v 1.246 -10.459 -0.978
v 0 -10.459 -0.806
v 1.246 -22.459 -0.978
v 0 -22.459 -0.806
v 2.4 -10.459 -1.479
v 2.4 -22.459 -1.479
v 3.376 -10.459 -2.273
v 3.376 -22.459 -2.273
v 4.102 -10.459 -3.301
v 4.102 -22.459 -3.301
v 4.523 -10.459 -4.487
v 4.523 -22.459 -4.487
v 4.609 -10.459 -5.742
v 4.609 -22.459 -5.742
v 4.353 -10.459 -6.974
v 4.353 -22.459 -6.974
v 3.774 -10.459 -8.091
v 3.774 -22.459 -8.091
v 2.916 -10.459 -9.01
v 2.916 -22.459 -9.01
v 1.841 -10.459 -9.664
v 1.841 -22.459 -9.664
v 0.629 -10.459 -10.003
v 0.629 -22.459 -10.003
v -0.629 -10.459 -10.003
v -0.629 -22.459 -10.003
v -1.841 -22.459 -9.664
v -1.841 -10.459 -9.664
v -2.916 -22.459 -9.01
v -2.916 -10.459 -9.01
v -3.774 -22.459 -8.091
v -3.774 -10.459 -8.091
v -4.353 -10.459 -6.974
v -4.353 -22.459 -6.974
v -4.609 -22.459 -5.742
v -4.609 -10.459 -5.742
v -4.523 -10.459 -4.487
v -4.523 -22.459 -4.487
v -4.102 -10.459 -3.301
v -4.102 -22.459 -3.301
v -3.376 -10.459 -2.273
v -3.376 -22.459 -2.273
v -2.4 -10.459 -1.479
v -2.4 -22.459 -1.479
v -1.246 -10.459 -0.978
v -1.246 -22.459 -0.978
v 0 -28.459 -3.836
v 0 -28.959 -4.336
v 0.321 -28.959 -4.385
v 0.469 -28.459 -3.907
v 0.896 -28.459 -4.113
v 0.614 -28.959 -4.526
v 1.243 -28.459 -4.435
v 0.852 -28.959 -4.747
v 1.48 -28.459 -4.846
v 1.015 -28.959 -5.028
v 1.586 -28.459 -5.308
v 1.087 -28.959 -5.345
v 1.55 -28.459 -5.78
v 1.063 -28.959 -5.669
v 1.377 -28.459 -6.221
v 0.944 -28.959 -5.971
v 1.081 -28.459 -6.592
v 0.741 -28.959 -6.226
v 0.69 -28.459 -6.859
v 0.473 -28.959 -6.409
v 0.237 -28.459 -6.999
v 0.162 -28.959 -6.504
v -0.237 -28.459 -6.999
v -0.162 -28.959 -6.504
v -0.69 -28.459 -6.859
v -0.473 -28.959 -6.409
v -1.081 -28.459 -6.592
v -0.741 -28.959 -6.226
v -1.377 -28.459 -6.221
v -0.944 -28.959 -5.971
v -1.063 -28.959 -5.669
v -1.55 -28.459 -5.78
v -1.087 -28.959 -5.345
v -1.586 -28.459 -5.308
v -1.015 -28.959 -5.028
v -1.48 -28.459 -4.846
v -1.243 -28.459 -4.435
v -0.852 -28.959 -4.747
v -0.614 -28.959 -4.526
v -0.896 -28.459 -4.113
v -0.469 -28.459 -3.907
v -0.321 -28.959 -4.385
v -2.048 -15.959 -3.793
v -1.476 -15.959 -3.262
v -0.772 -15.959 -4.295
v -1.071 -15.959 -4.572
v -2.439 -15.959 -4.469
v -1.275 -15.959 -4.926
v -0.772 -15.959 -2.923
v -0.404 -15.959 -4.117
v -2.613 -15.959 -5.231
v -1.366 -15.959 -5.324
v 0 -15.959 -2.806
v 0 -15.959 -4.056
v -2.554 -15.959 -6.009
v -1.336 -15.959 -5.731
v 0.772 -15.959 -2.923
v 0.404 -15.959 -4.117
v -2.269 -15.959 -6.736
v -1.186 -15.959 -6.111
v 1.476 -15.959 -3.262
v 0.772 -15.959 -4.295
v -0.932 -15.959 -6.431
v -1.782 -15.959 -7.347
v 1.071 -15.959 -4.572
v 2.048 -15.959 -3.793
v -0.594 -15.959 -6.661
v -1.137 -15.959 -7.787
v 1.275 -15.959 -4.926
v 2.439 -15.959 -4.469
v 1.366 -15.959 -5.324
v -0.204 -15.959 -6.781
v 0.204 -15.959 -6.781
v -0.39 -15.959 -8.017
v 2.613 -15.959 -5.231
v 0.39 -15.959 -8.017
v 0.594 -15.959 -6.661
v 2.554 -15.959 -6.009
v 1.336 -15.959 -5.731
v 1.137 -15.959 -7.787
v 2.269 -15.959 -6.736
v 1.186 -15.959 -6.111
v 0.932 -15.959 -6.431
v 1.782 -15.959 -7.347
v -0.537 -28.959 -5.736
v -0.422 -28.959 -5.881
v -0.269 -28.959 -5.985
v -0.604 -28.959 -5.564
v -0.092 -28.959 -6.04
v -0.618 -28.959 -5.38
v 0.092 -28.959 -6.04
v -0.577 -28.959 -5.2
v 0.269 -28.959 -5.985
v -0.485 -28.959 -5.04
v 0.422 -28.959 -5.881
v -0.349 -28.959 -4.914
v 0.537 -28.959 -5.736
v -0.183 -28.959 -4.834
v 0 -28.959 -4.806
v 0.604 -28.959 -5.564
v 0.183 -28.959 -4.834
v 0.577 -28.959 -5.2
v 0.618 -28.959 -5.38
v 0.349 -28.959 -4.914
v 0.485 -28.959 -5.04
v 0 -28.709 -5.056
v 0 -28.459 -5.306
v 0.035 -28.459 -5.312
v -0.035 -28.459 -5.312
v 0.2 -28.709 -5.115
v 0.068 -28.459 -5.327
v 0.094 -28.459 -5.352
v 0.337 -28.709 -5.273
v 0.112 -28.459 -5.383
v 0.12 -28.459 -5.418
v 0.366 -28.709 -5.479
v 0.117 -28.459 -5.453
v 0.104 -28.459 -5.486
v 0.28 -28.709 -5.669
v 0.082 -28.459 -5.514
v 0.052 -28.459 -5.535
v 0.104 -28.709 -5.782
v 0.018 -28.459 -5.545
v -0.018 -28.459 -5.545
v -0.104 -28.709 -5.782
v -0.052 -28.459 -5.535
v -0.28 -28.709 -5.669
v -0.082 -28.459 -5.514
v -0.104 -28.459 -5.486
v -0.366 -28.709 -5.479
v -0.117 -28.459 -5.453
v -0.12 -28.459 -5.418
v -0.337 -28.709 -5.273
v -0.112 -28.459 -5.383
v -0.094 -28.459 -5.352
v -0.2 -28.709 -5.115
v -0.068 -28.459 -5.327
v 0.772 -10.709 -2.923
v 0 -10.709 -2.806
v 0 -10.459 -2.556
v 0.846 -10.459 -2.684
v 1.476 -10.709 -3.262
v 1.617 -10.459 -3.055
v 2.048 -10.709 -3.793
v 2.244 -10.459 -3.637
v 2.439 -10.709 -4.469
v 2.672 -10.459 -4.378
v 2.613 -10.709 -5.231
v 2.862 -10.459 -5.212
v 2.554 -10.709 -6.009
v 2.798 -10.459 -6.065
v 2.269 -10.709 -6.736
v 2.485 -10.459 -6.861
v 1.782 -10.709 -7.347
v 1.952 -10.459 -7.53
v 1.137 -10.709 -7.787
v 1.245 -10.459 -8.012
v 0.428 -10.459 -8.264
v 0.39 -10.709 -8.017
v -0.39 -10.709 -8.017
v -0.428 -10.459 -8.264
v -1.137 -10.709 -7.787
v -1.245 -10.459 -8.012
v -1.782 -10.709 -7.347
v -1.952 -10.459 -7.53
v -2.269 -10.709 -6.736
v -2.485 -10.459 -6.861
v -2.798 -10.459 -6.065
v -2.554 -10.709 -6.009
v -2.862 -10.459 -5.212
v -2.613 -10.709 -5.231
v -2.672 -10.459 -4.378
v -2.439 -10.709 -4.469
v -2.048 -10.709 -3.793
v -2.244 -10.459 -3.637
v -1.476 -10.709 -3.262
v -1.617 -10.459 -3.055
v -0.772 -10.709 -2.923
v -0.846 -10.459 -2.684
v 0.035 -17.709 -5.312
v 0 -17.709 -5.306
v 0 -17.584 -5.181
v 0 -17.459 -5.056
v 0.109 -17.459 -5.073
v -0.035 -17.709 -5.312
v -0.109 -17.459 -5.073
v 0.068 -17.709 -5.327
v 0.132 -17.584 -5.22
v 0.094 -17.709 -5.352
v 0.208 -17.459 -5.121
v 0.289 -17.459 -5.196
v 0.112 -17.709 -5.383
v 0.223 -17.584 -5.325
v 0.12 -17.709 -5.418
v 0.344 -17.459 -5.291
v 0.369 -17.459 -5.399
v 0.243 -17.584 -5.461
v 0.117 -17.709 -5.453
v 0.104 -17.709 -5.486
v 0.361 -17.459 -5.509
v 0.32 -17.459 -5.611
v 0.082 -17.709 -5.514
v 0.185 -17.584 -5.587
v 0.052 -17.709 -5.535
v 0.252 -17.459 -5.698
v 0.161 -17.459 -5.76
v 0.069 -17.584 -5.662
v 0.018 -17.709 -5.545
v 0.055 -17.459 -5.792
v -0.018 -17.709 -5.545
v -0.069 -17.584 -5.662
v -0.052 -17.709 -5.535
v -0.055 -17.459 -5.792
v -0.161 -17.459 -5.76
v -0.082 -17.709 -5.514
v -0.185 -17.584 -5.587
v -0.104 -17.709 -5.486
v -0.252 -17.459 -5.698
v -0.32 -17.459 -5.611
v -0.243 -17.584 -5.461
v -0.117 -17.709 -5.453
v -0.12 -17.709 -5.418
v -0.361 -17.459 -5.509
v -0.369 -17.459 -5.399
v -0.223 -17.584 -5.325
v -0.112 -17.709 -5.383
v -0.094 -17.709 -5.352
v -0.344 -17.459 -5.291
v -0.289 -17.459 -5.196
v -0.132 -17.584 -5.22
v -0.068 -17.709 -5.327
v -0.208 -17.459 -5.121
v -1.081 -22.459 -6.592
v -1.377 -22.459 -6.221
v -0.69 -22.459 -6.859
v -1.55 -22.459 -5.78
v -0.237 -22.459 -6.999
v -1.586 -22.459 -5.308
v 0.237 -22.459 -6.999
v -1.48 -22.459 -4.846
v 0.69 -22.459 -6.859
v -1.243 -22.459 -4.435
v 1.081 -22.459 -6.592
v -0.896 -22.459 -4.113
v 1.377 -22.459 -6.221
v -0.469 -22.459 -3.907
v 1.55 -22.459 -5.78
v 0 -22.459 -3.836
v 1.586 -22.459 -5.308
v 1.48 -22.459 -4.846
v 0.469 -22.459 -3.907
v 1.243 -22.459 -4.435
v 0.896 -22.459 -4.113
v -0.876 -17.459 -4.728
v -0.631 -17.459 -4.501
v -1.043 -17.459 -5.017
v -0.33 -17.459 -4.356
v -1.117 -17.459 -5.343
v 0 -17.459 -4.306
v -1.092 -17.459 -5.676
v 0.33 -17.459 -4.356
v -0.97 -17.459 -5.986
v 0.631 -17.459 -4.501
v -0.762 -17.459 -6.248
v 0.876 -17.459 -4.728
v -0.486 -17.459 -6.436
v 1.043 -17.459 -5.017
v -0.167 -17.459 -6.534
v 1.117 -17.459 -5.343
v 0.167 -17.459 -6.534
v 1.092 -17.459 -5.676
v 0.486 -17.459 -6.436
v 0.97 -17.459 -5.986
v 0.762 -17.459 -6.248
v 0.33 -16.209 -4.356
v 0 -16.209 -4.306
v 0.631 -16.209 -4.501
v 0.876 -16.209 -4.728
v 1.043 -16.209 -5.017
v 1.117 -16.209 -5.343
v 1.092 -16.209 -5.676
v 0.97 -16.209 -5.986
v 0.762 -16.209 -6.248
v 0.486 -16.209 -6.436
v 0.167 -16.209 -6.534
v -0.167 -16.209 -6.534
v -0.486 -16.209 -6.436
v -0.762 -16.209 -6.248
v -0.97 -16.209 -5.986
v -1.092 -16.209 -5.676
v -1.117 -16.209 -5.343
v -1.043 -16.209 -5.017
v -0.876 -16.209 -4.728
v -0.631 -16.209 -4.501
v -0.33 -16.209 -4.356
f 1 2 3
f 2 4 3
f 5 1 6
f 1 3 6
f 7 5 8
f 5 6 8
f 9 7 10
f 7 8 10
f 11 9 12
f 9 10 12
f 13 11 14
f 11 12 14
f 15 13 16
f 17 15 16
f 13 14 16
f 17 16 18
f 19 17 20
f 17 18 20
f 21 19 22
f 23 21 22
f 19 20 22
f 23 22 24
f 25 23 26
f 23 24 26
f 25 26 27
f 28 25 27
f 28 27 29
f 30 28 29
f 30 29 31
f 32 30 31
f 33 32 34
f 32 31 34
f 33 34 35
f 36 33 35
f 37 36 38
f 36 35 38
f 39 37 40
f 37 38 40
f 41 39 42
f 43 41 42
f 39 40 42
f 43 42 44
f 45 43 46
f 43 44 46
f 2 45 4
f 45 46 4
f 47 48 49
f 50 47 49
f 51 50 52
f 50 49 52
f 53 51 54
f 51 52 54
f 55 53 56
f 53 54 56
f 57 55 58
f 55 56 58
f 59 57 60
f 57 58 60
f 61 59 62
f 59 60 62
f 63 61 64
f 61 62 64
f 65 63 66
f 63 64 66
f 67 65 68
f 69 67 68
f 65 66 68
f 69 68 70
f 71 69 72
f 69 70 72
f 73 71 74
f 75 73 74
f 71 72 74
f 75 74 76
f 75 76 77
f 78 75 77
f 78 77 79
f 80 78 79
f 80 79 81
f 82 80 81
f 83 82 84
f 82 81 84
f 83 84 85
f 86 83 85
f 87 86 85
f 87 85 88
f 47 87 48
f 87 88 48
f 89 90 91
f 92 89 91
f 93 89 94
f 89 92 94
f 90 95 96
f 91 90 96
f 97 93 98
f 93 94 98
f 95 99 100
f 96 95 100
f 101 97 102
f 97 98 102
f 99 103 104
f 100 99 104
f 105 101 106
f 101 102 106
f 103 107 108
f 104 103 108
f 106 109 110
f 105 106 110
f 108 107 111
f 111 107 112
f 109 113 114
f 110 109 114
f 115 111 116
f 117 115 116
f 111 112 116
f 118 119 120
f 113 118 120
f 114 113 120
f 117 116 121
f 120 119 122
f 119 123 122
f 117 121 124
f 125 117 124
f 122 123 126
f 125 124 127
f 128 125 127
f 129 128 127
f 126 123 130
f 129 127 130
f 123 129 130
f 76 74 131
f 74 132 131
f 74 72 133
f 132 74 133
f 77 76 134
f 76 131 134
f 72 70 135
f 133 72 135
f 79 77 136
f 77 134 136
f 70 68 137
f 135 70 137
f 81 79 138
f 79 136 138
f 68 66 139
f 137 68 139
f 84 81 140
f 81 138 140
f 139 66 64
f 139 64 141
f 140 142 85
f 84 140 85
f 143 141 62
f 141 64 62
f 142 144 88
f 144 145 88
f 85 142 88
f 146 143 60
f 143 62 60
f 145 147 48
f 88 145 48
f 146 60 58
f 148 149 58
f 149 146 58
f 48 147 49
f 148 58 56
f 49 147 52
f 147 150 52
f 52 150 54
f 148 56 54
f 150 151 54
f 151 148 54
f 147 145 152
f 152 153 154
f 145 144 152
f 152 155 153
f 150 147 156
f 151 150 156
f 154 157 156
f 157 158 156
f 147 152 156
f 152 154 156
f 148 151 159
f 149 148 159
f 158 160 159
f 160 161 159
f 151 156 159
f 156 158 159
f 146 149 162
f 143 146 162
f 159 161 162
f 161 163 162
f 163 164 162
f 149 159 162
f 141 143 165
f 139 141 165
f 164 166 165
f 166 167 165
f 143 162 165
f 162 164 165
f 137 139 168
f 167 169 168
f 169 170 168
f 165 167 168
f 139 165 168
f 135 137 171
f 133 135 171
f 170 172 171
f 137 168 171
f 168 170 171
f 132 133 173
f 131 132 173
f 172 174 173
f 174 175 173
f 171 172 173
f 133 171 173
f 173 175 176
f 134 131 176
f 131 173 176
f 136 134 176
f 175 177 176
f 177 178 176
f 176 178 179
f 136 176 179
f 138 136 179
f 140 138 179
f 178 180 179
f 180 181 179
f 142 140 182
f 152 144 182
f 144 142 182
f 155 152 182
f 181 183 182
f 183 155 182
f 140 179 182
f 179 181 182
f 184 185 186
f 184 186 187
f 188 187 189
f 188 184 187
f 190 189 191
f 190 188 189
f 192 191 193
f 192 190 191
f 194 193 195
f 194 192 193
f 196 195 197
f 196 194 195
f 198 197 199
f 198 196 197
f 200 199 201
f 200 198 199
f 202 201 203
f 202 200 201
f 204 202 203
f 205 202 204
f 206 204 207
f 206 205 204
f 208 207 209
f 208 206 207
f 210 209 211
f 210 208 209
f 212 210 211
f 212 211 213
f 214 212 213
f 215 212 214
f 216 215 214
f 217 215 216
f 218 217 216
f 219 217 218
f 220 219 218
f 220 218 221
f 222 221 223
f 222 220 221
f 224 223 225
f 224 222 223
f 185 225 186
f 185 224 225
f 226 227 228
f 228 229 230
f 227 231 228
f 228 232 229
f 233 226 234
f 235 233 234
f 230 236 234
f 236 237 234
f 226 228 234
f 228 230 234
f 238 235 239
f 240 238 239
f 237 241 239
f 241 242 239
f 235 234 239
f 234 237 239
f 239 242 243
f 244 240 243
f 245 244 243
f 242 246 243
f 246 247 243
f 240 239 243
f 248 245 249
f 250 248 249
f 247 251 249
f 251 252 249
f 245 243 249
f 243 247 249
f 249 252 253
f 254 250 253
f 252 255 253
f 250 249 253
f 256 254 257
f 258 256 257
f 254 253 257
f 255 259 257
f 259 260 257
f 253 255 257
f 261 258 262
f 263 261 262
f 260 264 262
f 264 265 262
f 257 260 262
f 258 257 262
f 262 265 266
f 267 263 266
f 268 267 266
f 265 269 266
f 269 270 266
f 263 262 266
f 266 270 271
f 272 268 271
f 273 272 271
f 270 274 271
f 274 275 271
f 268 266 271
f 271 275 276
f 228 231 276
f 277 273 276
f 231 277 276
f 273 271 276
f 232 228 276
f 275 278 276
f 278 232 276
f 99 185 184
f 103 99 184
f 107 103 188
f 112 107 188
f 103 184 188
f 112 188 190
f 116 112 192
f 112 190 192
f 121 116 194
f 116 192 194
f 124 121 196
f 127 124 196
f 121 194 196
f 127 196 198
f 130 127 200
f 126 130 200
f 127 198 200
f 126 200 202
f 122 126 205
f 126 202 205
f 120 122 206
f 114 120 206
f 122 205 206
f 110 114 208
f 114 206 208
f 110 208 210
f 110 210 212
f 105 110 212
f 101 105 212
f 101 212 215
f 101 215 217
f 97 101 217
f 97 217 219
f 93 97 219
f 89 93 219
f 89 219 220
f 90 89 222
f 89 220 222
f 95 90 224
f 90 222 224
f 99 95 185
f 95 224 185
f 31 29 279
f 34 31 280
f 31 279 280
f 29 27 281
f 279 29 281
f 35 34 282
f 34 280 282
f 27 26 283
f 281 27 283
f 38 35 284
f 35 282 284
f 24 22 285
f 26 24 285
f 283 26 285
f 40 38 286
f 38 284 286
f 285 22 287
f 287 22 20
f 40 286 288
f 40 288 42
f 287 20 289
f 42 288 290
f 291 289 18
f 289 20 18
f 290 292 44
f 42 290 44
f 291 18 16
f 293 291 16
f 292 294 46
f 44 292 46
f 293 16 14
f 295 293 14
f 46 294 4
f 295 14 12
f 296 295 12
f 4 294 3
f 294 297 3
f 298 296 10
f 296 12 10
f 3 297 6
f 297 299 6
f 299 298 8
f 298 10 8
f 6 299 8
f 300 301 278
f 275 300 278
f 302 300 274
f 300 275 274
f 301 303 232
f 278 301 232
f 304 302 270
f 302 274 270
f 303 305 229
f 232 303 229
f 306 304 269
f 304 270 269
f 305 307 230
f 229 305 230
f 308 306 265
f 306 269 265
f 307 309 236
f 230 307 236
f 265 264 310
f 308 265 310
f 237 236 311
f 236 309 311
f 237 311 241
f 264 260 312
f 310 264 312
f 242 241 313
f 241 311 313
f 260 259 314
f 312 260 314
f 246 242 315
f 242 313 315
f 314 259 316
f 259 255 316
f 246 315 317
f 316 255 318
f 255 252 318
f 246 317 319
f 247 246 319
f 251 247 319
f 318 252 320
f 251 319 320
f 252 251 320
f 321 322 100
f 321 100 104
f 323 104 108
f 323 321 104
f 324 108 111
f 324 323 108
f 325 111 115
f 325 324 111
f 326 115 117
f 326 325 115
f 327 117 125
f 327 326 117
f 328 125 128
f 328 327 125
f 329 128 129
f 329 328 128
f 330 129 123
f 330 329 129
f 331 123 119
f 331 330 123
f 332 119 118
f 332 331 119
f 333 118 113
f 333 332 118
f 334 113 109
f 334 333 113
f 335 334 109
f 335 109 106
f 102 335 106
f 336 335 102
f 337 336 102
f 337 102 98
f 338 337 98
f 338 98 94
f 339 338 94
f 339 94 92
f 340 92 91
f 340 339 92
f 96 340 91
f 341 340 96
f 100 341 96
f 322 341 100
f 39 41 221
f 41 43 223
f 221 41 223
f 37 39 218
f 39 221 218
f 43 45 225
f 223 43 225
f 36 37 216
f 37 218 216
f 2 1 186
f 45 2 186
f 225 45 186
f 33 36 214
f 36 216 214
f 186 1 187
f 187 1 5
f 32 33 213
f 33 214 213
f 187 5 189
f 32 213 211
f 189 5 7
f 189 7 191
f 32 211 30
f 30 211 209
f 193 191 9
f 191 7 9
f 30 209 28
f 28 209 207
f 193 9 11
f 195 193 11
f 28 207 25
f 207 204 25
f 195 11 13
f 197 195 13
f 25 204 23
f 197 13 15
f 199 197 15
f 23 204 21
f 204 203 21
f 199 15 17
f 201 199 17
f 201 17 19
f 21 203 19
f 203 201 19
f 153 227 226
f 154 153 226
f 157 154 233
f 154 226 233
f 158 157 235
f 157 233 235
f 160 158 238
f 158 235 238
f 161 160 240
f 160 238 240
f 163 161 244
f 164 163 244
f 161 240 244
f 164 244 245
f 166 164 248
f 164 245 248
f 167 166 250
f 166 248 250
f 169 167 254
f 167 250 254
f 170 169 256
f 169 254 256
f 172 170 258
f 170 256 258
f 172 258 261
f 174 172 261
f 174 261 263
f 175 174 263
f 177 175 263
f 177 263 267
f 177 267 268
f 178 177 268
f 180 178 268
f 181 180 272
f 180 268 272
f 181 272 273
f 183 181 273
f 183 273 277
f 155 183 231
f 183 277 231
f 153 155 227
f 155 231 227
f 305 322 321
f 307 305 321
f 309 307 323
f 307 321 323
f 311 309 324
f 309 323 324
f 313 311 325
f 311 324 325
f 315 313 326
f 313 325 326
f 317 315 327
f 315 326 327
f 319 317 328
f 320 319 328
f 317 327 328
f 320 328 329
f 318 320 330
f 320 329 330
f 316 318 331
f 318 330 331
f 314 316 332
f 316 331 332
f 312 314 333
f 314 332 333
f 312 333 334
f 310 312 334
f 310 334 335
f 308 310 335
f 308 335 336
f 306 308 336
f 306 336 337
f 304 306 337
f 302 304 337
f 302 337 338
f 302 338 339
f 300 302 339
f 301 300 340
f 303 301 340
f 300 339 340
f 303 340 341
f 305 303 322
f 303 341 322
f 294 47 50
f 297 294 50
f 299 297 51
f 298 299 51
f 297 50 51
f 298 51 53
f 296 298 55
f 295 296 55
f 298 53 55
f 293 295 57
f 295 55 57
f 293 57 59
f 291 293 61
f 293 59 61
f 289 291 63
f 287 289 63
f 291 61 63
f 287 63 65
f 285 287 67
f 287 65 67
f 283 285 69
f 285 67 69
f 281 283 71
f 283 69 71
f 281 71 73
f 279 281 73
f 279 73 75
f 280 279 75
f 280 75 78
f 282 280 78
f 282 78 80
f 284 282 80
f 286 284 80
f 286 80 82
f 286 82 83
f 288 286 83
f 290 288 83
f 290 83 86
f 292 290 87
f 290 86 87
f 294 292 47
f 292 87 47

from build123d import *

# Parameters (mm, degrees)
F2_SIZE = 0.5
F3_SIZE = 0.25


with BuildPart() as f1:
    # F0 (on Right) → F1 (revolve)
    with BuildSketch(Plane.YZ):
        Polygon((-15.9592820017, -2.8064947682), (-10.4592820017, -2.8064947682), (-10.4592820017, -0.8064947682), (-22.4592820017, -0.8064947682), (-22.4592820017, -3.8364947682), (-28.9592820017, -3.8364947682), (-28.9592820017, -5.3064947682), (-17.4592820017, -5.3064947682), (-17.4592820017, -4.3064947682), (-15.9592820017, -4.3064947682), align=None)
    revolve(axis=Axis((0, -19.7092820017, -5.4264947682), (0, 1, 0)))

    # F2
    f2_edges = [f1.edges().sort_by_distance(p)[0] for p in [
        (0, -28.959282, -7.016495),
        (0, -28.959282, -5.546495),
    ]]
    chamfer(f2_edges, length=F2_SIZE)

    # F3
    f3_edges = [f1.edges().sort_by_distance(p)[0] for p in [
        (0, -15.959282, -6.546495),
        (0, -10.459282, -8.046495),
        (0, -17.459282, -5.546495),
    ]]
    chamfer(f3_edges, length=F3_SIZE)


solid = f1.part
